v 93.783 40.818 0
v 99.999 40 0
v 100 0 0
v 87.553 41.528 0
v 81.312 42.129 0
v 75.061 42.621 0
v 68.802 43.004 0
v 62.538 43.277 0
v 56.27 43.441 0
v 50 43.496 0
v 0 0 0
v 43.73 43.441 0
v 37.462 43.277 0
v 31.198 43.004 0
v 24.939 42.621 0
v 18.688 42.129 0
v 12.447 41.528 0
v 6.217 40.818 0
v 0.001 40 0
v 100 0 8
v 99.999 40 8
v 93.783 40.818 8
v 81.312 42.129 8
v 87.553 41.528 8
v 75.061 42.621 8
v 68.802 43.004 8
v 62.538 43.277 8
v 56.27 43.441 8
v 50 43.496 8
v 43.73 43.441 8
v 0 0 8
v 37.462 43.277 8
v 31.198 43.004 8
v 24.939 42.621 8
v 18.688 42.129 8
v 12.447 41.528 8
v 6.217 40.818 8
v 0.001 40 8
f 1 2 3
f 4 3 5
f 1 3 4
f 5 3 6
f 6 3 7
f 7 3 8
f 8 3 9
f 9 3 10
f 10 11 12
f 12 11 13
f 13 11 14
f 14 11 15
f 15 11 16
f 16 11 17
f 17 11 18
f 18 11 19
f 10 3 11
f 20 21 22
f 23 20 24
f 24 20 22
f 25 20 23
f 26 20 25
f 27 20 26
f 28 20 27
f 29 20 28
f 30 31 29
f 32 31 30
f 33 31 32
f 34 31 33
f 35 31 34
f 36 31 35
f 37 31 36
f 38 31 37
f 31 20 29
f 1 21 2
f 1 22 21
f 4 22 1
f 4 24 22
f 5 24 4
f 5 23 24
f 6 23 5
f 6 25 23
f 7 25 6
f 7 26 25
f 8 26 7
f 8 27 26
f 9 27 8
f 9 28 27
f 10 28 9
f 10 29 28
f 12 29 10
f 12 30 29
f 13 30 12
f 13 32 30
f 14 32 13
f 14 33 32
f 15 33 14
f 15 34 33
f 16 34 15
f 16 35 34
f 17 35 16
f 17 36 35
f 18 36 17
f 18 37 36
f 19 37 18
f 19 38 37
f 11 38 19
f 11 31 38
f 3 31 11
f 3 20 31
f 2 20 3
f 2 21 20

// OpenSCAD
$fn = 32;

// ----------------------------------------------------------------------
// Arc profile plate: crown, 19 points
// ----------------------------------------------------------------------

// --- parameters (mm) ---
bar_l = 100;              // bar length, X
bar_w = 40;               // bar height at the ends, Y
arc_r = 359.26;           // radius of the crown arc
arc_angle = 16;           // crown arc angle, degrees
crown_rise = 3.5;         // rise of the crown over the ends
arc_step = 1;             // sampling step of the crown arc, degrees
plate_t = 8;              // plate thickness, Z
fit_tol = 0.1;            // declared fit tolerance (prompt contract)
free_tol = 0.5;           // declared free tolerance (prompt contract)

bbox_y = bar_w + crown_rise;  // full height with the crown

profile = [[99.999, 40], [93.783, 40.818], [87.553, 41.528], [81.312, 42.129], [75.061, 42.621], [68.802, 43.004], [62.538, 43.277], [56.27, 43.441], [50, 43.496], [43.73, 43.441], [37.462, 43.277], [31.198, 43.004], [24.939, 42.621], [18.688, 42.129], [12.447, 41.528], [6.217, 40.818], [0.001, 40], [0, 0], [100, 0]];  // primary outline, 19 points, counter clockwise

// --- the one profile operation ---
linear_extrude(height = plate_t) polygon(points = profile);
